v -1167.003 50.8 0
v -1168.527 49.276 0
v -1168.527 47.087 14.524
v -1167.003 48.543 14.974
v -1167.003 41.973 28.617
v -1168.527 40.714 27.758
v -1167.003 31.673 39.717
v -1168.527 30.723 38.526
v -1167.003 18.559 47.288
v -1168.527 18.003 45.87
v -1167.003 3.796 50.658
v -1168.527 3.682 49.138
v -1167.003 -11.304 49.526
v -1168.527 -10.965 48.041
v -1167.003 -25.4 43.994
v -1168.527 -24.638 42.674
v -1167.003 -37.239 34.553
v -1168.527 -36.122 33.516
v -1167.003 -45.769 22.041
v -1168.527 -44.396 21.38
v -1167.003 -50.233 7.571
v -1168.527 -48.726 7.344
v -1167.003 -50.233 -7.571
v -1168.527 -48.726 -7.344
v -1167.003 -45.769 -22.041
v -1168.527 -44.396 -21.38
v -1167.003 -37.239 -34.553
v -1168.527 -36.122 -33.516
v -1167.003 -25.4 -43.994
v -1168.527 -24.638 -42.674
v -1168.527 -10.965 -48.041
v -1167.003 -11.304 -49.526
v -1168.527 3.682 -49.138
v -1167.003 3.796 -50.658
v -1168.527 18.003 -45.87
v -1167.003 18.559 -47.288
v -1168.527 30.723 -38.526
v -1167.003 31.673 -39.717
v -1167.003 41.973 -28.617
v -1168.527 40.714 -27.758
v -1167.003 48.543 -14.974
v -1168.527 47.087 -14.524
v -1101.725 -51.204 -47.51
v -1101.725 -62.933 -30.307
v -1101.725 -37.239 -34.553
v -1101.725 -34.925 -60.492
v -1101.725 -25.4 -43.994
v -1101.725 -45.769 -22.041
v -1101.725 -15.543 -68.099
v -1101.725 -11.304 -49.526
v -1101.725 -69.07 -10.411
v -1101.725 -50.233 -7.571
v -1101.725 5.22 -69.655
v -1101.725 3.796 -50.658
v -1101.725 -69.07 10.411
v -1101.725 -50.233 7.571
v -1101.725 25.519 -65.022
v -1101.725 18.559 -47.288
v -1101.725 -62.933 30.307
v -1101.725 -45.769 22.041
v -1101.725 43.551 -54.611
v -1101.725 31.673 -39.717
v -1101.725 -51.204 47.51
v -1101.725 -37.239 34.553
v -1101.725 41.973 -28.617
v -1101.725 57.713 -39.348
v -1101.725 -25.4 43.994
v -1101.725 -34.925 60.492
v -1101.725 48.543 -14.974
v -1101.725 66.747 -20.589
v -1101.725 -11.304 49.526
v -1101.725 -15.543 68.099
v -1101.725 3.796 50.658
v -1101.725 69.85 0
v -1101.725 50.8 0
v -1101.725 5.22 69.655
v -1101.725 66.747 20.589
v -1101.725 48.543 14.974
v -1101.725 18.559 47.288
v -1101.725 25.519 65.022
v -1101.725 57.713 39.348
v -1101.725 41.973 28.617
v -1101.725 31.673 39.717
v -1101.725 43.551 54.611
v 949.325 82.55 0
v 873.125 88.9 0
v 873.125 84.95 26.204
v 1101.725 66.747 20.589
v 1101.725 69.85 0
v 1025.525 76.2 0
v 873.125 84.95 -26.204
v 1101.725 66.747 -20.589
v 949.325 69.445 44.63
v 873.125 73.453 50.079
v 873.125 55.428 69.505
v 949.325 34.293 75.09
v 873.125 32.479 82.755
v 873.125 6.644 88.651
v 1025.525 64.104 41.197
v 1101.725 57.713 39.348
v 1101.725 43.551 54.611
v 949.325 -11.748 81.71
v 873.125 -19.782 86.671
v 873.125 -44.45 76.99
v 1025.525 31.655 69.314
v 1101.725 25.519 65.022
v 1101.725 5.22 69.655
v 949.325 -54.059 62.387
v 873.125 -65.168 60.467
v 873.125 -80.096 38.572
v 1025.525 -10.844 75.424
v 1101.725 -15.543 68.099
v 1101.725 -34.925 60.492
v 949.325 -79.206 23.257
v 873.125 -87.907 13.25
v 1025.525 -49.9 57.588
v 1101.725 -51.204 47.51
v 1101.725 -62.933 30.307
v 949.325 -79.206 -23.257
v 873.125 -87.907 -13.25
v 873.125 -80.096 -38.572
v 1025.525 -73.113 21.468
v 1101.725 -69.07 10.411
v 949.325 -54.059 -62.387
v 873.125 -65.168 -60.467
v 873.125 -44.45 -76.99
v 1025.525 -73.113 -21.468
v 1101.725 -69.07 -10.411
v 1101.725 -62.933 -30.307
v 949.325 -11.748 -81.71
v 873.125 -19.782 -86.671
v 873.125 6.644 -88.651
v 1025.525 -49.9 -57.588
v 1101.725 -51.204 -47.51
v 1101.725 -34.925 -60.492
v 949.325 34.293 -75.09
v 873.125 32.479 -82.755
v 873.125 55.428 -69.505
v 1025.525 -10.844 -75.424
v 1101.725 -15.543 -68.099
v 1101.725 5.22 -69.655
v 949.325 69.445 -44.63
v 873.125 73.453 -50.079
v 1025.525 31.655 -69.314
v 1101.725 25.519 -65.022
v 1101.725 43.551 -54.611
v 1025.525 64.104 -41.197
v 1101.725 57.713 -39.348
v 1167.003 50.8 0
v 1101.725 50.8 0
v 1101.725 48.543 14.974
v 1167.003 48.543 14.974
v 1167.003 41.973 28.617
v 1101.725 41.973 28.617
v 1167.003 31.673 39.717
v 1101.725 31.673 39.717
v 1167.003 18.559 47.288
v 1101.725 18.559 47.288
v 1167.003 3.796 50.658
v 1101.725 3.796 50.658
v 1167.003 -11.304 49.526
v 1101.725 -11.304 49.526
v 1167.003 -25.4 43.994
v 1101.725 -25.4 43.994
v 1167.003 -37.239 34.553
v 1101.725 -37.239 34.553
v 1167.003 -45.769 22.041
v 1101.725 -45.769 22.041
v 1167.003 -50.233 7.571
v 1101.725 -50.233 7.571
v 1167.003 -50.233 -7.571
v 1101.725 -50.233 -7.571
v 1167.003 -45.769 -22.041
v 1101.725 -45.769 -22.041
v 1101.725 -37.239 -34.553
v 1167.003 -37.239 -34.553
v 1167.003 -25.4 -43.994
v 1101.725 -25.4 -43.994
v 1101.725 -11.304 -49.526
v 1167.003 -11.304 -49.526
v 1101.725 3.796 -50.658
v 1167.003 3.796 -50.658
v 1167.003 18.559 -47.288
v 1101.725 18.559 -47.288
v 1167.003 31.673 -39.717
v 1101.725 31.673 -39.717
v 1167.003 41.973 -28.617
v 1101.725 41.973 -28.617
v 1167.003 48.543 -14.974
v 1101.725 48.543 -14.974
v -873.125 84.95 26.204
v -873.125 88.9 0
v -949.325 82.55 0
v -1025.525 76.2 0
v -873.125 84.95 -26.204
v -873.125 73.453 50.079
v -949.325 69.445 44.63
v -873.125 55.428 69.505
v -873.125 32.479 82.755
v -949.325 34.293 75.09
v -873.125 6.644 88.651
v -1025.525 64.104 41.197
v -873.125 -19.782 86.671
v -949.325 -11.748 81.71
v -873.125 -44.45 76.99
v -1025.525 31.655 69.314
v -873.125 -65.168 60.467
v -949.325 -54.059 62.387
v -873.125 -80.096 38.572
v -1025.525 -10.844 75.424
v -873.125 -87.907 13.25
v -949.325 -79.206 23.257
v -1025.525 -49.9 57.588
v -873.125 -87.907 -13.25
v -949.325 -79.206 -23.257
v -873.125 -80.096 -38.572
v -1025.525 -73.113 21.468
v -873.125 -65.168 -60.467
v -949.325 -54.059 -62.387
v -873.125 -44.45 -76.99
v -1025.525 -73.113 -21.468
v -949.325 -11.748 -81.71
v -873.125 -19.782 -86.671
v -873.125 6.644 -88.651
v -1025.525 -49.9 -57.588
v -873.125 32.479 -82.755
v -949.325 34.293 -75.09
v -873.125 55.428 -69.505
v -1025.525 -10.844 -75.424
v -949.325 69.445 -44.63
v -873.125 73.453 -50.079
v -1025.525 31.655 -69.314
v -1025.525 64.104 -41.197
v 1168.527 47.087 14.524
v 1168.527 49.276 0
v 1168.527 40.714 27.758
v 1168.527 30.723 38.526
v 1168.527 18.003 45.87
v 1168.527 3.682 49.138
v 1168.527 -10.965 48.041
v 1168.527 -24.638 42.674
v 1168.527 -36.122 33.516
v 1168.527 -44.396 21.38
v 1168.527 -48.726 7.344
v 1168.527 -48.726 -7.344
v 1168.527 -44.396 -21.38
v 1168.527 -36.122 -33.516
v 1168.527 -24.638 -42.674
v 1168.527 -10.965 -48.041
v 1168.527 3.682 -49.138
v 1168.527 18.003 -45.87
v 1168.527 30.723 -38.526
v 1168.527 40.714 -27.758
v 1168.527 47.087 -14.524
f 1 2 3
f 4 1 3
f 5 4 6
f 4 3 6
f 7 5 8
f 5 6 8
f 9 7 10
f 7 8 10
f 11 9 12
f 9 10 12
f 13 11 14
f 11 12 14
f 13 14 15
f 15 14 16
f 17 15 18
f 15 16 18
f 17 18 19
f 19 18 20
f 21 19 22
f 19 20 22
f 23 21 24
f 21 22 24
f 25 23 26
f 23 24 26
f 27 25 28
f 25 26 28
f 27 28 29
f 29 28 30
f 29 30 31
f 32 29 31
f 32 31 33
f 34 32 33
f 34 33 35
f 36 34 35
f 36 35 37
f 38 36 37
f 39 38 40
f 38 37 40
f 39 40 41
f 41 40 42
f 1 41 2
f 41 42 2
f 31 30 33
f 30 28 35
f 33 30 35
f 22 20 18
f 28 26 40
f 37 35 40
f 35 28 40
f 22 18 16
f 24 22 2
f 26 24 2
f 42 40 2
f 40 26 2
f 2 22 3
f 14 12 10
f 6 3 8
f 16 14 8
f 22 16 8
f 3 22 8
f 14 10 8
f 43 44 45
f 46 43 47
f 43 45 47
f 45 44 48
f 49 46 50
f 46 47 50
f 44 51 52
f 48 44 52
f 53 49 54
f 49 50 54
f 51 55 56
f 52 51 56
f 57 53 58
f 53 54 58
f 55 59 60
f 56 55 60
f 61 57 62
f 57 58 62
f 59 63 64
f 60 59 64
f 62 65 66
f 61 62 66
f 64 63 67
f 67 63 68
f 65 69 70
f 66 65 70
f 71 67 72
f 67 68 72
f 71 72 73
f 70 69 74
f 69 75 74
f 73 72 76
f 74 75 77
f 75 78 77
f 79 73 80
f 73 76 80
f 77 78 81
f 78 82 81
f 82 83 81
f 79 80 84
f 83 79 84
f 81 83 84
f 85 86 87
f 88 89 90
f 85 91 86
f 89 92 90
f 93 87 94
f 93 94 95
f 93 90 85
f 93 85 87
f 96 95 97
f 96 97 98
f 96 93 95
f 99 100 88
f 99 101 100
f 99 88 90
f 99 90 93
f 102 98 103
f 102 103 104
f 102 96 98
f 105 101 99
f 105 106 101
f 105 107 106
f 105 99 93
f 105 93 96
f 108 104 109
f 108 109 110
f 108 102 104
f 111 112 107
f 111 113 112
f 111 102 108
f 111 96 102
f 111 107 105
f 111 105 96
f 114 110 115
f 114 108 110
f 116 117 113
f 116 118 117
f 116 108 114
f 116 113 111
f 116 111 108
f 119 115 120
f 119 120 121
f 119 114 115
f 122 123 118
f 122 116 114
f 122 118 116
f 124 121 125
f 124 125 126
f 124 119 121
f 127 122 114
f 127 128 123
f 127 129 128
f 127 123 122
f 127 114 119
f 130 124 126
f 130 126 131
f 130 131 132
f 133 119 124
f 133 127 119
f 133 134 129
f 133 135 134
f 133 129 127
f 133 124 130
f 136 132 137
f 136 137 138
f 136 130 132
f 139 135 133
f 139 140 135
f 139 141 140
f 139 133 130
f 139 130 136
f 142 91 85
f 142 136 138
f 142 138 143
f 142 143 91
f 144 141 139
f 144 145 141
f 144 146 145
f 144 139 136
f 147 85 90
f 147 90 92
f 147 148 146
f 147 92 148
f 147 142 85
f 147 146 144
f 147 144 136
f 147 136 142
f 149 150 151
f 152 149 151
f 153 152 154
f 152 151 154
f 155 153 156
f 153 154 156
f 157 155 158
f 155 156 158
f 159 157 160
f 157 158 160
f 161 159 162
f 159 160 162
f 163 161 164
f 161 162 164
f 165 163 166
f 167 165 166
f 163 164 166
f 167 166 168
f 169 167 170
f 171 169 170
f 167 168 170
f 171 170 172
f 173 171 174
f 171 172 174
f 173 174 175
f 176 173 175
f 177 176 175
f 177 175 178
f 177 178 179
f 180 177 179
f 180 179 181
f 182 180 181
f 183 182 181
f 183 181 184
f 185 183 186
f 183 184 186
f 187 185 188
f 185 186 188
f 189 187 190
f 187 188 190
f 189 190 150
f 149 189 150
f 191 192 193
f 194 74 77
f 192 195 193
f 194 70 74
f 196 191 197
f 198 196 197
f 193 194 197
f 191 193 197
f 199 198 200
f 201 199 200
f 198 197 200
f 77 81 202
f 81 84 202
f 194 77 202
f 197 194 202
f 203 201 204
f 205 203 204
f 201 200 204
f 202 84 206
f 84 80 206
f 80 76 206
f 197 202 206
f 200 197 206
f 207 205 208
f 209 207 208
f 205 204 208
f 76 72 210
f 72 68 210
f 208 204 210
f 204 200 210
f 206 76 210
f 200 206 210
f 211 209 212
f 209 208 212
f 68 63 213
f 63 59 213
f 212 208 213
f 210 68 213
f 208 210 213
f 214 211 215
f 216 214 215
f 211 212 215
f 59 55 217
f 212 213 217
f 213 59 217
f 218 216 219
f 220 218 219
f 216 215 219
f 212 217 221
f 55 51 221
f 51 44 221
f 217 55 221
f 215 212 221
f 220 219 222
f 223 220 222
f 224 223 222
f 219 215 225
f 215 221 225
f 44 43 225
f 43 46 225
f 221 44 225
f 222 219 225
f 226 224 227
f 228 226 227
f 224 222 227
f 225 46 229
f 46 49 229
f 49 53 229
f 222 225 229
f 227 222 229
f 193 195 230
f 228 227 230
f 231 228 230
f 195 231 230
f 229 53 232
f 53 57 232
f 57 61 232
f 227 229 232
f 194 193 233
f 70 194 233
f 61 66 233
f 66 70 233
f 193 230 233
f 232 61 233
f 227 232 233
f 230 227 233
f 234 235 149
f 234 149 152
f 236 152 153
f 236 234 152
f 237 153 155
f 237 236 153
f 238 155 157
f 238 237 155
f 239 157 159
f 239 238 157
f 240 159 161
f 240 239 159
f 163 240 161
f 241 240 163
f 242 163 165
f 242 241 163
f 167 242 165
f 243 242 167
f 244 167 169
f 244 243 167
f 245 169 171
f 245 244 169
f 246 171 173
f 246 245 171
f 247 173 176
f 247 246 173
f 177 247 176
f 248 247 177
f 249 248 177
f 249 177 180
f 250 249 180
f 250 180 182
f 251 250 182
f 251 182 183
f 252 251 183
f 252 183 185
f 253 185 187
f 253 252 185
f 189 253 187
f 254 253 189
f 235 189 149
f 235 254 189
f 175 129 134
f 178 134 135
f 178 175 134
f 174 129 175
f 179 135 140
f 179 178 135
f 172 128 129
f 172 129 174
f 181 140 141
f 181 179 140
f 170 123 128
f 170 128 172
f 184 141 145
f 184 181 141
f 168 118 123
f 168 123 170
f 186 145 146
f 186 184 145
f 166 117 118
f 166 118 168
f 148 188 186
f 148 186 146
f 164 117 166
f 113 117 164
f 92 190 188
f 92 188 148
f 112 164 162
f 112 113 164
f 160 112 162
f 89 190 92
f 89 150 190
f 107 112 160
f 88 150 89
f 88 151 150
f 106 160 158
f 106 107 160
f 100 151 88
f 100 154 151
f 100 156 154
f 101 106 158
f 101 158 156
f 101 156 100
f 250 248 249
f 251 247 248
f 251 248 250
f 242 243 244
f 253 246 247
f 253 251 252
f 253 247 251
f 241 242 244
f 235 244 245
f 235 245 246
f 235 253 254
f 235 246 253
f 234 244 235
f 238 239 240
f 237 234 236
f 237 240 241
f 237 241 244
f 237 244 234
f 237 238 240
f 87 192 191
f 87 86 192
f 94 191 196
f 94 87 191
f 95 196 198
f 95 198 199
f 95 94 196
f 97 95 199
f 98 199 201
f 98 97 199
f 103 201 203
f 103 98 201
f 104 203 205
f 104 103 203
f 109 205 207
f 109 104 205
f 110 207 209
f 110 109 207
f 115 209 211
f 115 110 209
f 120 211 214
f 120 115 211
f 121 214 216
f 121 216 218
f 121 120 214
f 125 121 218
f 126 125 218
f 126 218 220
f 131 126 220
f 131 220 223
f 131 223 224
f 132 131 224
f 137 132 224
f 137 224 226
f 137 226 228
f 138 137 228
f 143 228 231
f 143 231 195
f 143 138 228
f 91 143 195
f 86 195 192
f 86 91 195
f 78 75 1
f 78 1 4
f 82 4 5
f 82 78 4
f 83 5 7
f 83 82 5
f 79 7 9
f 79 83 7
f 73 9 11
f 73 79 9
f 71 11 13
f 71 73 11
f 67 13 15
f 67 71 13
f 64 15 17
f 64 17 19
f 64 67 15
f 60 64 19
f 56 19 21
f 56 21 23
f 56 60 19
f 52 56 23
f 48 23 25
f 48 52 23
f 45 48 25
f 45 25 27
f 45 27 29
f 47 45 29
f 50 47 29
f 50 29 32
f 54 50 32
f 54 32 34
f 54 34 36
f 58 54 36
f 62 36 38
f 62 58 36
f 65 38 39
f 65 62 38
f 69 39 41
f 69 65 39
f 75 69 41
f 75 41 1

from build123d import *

# Parameters (mm, degrees)
F0_R      = 88.9
F1_DEPTH  = 873.125
F1_FACE_R = 88.9
F3_R      = 69.85
F5_R      = 50.8
F6_DEPTH  = 66.802
F7_SIZE   = 1.524


with BuildPart() as f1:
    # F0 (on Right) → F1 (new body, symmetric)
    with BuildSketch(Plane.YZ):
        Circle(F0_R)
    extrude(amount=F1_DEPTH, both=True)

    # F1_face (on face) → F4 section 0
    with BuildSketch(Plane.YZ.offset(873.125)):
        Circle(F1_FACE_R)
    # F3 (on offset) → F4 section 1
    with BuildSketch(Plane.YZ.offset(1101.725)):
        Circle(F3_R)
    loft()

    # F5 (on face) → F6 (join)
    with BuildSketch(Plane.YZ.offset(1101.725)):
        Circle(F5_R)
    extrude(amount=F6_DEPTH)

    # F7
    f7_edges = [f1.edges().sort_by_distance(p)[0] for p in [
        (1168.527, -50.8, 0),
    ]]
    chamfer(f7_edges, length=F7_SIZE)

    # F8: F1 across plane


with BuildPart() as f1_1:
    add(f1.part)
    add(f1.part.mirror(Plane.YZ))


solid = f1_1.part
